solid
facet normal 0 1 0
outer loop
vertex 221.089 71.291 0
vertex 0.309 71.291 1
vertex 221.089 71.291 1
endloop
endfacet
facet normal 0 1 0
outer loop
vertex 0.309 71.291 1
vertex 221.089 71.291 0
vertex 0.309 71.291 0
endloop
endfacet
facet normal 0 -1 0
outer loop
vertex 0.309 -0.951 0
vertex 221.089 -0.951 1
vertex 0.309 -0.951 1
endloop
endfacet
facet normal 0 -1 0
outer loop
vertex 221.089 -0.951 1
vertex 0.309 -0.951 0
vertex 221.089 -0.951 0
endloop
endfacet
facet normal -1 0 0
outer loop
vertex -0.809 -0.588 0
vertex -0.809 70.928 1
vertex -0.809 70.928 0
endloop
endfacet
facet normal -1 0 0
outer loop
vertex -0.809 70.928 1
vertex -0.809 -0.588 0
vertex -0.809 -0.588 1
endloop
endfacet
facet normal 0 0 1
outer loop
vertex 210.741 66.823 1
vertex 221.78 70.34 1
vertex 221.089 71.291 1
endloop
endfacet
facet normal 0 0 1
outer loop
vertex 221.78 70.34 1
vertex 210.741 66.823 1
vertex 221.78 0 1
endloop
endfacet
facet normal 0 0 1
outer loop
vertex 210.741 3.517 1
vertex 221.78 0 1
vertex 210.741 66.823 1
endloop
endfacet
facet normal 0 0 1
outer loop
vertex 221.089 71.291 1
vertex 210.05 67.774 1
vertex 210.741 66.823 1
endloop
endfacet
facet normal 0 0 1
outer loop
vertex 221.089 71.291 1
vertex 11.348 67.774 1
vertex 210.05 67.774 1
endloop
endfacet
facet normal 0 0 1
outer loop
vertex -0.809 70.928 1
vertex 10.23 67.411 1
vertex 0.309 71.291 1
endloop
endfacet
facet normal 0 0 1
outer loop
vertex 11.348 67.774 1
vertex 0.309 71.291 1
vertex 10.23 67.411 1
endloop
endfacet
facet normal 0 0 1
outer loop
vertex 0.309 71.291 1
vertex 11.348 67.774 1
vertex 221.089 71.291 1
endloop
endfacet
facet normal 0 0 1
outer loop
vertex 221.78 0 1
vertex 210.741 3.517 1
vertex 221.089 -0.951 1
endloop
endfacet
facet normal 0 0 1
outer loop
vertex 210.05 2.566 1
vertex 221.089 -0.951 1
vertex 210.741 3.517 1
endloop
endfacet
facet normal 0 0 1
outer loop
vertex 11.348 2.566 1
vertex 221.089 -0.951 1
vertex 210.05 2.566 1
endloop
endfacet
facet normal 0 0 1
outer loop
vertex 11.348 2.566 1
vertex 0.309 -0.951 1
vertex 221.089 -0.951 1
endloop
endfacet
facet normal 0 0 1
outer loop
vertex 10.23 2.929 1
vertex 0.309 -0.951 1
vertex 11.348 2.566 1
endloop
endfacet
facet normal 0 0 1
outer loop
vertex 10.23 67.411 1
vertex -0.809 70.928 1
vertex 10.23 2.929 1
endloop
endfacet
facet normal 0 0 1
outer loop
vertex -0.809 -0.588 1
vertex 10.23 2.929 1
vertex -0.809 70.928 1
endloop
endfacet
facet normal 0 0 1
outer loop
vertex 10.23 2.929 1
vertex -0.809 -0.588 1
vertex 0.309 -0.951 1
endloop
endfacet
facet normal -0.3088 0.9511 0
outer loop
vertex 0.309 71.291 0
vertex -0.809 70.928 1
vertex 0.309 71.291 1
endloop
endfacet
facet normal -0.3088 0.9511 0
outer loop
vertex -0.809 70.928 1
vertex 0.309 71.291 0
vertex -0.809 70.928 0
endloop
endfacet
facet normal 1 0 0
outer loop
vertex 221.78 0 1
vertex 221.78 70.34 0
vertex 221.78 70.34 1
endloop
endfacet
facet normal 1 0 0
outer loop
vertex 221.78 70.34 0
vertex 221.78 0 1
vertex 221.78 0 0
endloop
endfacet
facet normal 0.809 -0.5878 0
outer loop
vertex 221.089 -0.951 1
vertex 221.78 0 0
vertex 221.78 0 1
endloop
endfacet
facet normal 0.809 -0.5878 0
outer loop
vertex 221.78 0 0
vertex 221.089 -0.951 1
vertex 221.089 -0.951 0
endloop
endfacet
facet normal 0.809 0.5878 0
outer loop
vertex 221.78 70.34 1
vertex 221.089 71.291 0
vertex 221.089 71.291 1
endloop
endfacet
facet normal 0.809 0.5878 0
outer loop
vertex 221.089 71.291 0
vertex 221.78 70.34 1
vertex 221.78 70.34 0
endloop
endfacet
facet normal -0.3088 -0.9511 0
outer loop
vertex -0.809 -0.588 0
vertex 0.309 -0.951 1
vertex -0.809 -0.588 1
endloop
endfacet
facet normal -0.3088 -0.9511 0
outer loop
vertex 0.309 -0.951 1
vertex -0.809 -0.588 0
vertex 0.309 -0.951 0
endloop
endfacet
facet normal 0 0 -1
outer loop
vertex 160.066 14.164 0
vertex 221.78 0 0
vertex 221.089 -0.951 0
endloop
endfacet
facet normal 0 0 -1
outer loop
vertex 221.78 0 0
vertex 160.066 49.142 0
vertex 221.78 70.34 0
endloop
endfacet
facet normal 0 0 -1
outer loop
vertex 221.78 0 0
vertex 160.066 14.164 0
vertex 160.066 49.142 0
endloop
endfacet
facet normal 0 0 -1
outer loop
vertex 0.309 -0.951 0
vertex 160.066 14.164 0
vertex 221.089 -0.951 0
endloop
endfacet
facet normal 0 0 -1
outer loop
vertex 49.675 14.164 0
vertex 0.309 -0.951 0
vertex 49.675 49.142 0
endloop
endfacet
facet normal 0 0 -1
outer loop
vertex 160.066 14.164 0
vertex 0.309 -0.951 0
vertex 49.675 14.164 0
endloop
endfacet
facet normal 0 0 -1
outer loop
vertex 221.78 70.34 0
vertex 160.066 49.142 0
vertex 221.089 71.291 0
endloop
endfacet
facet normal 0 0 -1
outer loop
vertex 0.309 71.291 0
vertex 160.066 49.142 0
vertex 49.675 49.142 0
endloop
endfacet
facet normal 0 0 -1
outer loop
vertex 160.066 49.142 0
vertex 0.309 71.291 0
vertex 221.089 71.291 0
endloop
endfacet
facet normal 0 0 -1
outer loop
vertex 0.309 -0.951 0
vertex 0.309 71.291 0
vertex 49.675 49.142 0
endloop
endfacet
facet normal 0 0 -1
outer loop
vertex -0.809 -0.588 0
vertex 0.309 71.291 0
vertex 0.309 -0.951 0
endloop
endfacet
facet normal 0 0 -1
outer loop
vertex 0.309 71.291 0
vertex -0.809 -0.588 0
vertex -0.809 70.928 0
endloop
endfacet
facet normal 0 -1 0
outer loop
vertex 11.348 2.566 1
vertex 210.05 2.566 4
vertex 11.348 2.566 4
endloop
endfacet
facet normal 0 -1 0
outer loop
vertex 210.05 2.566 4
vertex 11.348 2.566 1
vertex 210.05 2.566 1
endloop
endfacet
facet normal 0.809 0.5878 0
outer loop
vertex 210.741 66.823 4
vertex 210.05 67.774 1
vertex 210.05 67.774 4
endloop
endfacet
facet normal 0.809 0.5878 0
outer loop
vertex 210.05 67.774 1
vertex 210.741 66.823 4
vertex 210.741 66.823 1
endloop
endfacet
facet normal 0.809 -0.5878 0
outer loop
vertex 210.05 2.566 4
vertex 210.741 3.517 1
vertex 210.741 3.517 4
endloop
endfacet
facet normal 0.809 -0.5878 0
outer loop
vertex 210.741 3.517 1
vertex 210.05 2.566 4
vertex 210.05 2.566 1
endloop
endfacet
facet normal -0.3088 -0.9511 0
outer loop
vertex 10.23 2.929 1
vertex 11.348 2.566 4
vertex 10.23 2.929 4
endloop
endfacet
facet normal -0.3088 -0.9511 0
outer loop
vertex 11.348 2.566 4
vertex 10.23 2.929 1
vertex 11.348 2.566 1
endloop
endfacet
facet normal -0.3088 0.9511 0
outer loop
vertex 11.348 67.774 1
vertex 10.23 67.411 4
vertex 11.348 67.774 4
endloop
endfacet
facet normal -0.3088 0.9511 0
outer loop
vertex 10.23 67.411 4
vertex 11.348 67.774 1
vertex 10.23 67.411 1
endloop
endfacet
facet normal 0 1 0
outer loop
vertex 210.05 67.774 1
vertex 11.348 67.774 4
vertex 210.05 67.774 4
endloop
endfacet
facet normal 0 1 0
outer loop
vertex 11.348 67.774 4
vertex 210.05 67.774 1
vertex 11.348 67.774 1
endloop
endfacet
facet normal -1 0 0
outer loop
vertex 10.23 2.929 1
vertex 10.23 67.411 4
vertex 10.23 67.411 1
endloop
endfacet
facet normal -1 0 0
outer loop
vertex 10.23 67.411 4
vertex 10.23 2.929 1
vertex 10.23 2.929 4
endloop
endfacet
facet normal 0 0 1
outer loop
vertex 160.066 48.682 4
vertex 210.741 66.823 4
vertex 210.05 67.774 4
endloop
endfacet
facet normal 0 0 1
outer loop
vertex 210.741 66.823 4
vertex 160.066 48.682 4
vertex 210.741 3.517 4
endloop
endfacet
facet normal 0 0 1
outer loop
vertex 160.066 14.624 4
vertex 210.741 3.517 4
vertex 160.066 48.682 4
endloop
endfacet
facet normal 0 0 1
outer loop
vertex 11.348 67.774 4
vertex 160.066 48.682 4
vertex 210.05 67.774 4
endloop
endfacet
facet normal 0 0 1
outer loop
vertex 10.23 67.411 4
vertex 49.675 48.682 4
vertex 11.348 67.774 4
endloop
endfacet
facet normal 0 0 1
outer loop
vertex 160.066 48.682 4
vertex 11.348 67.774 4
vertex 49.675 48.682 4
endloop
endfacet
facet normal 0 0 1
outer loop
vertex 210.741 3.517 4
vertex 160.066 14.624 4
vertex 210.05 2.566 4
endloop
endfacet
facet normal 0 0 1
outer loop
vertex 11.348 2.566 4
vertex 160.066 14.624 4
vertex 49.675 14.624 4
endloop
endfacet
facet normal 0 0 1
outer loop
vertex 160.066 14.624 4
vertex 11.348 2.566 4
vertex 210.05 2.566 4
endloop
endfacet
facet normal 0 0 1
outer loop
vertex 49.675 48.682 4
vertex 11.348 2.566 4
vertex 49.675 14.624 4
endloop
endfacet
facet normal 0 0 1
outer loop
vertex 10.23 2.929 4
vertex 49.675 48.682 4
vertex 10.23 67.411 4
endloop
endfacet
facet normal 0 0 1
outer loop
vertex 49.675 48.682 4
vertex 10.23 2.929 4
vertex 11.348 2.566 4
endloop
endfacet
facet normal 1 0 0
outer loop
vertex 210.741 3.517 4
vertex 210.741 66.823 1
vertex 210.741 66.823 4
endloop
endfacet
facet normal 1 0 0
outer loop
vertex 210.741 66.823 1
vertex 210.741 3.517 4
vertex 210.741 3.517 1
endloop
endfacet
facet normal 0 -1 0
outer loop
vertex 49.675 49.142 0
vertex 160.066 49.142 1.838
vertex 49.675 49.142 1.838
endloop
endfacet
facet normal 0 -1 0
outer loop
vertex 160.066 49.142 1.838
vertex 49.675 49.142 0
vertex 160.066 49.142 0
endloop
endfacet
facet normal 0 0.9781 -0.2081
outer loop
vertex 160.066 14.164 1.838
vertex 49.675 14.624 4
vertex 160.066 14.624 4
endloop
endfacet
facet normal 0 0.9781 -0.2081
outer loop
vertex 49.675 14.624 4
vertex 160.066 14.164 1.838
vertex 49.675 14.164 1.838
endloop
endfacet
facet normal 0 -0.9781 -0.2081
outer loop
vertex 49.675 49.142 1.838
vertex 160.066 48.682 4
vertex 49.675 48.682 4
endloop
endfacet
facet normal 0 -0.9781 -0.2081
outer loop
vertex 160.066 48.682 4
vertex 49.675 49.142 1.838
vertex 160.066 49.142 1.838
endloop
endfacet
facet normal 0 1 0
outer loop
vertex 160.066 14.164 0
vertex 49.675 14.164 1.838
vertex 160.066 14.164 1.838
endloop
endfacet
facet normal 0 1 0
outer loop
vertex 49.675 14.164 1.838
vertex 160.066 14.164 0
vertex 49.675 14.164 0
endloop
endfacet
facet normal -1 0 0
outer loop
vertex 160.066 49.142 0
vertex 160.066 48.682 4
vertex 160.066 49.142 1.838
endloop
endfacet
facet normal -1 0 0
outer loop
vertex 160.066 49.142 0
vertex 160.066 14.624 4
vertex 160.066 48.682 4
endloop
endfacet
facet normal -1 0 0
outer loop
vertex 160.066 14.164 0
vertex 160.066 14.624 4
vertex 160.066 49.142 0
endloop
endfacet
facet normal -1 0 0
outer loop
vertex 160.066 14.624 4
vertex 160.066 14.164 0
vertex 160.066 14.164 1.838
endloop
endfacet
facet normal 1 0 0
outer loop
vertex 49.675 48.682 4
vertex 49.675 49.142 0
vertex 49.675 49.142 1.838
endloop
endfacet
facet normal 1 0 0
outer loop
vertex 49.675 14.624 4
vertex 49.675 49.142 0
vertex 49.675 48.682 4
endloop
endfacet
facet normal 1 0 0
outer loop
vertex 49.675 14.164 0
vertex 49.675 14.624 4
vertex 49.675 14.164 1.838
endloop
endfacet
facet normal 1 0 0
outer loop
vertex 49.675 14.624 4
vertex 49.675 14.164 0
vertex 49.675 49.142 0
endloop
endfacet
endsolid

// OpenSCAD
//Lid
height = 1;
length = 1;
x = 220.78;
y = 70.34;

//Lid lip
lip_height = 4;
lip_length = 1;
lip_percent = .9; 

//Opening
opening_length = x/2;
opening_width = y/2;


module lid(height, lenght, x, y, lip_height, lip_lenght, lip_percent){
        //lip_x_y
	lip_x = x * lip_percent;
	lip_y = y * lip_percent;

	//Middle
	x_middle = (x - lip_x)/2;
	y_middle = (y - lip_y)/2;
	
	//Object
	union(){
		hull(){
		    translate([0, 0, 0]){
			cylinder(height);
		    }
		    translate([x, 0, 0]){
			cylinder(height);
		    }
		    translate([0, y, 0]){
			cylinder(height);
		    }
		    translate([x, y, 0]){
			cylinder(height);
		    }
		}
		translate([x_middle, y_middle, 0]) hull(){
		    translate([0, 0, 0]){
			cylinder(lip_height);
		    }
		    translate([lip_x, 0, 0]){
			cylinder(lip_height);
		    }
		    translate([0, lip_y, 0]){
			cylinder(lip_height);
		    }
		    translate([lip_x, lip_y, 0]){
			cylinder(lip_height);
		    }
		}
	}
}

module lid_with_opening(height, lenght, x, y, lip_height, lip_lenght, lip_percent, opening_length, opening_width){
    //lip_x_y
    lip_x = x * lip_percent;
    lip_y = y * lip_percent;

    //Middle
    x_middle = lip_x/4;
    y_middle = lip_y/2;

    difference(){
        lid(height, lenght, x, y, lip_height, lip_lenght, lip_percent);	
	color([0, 1, 0]) union(){
		translate([x_middle, y_middle, 0]){	
			rotate([0, 90, 0]){
				cylinder(opening_length, opening_width/2, opening_width/2);
			}
		}
		/*translate([x_middle, y_middle, 0]){
		    sphere(opening_width/2);
		}
		translate([opening_length, y_middle, 0]){
		    sphere(opening_width/2);
		}*/
        }
    }
}

lid_with_opening(height, length, x, y, lip_height, lip_length, lip_percent, opening_length, opening_width);
